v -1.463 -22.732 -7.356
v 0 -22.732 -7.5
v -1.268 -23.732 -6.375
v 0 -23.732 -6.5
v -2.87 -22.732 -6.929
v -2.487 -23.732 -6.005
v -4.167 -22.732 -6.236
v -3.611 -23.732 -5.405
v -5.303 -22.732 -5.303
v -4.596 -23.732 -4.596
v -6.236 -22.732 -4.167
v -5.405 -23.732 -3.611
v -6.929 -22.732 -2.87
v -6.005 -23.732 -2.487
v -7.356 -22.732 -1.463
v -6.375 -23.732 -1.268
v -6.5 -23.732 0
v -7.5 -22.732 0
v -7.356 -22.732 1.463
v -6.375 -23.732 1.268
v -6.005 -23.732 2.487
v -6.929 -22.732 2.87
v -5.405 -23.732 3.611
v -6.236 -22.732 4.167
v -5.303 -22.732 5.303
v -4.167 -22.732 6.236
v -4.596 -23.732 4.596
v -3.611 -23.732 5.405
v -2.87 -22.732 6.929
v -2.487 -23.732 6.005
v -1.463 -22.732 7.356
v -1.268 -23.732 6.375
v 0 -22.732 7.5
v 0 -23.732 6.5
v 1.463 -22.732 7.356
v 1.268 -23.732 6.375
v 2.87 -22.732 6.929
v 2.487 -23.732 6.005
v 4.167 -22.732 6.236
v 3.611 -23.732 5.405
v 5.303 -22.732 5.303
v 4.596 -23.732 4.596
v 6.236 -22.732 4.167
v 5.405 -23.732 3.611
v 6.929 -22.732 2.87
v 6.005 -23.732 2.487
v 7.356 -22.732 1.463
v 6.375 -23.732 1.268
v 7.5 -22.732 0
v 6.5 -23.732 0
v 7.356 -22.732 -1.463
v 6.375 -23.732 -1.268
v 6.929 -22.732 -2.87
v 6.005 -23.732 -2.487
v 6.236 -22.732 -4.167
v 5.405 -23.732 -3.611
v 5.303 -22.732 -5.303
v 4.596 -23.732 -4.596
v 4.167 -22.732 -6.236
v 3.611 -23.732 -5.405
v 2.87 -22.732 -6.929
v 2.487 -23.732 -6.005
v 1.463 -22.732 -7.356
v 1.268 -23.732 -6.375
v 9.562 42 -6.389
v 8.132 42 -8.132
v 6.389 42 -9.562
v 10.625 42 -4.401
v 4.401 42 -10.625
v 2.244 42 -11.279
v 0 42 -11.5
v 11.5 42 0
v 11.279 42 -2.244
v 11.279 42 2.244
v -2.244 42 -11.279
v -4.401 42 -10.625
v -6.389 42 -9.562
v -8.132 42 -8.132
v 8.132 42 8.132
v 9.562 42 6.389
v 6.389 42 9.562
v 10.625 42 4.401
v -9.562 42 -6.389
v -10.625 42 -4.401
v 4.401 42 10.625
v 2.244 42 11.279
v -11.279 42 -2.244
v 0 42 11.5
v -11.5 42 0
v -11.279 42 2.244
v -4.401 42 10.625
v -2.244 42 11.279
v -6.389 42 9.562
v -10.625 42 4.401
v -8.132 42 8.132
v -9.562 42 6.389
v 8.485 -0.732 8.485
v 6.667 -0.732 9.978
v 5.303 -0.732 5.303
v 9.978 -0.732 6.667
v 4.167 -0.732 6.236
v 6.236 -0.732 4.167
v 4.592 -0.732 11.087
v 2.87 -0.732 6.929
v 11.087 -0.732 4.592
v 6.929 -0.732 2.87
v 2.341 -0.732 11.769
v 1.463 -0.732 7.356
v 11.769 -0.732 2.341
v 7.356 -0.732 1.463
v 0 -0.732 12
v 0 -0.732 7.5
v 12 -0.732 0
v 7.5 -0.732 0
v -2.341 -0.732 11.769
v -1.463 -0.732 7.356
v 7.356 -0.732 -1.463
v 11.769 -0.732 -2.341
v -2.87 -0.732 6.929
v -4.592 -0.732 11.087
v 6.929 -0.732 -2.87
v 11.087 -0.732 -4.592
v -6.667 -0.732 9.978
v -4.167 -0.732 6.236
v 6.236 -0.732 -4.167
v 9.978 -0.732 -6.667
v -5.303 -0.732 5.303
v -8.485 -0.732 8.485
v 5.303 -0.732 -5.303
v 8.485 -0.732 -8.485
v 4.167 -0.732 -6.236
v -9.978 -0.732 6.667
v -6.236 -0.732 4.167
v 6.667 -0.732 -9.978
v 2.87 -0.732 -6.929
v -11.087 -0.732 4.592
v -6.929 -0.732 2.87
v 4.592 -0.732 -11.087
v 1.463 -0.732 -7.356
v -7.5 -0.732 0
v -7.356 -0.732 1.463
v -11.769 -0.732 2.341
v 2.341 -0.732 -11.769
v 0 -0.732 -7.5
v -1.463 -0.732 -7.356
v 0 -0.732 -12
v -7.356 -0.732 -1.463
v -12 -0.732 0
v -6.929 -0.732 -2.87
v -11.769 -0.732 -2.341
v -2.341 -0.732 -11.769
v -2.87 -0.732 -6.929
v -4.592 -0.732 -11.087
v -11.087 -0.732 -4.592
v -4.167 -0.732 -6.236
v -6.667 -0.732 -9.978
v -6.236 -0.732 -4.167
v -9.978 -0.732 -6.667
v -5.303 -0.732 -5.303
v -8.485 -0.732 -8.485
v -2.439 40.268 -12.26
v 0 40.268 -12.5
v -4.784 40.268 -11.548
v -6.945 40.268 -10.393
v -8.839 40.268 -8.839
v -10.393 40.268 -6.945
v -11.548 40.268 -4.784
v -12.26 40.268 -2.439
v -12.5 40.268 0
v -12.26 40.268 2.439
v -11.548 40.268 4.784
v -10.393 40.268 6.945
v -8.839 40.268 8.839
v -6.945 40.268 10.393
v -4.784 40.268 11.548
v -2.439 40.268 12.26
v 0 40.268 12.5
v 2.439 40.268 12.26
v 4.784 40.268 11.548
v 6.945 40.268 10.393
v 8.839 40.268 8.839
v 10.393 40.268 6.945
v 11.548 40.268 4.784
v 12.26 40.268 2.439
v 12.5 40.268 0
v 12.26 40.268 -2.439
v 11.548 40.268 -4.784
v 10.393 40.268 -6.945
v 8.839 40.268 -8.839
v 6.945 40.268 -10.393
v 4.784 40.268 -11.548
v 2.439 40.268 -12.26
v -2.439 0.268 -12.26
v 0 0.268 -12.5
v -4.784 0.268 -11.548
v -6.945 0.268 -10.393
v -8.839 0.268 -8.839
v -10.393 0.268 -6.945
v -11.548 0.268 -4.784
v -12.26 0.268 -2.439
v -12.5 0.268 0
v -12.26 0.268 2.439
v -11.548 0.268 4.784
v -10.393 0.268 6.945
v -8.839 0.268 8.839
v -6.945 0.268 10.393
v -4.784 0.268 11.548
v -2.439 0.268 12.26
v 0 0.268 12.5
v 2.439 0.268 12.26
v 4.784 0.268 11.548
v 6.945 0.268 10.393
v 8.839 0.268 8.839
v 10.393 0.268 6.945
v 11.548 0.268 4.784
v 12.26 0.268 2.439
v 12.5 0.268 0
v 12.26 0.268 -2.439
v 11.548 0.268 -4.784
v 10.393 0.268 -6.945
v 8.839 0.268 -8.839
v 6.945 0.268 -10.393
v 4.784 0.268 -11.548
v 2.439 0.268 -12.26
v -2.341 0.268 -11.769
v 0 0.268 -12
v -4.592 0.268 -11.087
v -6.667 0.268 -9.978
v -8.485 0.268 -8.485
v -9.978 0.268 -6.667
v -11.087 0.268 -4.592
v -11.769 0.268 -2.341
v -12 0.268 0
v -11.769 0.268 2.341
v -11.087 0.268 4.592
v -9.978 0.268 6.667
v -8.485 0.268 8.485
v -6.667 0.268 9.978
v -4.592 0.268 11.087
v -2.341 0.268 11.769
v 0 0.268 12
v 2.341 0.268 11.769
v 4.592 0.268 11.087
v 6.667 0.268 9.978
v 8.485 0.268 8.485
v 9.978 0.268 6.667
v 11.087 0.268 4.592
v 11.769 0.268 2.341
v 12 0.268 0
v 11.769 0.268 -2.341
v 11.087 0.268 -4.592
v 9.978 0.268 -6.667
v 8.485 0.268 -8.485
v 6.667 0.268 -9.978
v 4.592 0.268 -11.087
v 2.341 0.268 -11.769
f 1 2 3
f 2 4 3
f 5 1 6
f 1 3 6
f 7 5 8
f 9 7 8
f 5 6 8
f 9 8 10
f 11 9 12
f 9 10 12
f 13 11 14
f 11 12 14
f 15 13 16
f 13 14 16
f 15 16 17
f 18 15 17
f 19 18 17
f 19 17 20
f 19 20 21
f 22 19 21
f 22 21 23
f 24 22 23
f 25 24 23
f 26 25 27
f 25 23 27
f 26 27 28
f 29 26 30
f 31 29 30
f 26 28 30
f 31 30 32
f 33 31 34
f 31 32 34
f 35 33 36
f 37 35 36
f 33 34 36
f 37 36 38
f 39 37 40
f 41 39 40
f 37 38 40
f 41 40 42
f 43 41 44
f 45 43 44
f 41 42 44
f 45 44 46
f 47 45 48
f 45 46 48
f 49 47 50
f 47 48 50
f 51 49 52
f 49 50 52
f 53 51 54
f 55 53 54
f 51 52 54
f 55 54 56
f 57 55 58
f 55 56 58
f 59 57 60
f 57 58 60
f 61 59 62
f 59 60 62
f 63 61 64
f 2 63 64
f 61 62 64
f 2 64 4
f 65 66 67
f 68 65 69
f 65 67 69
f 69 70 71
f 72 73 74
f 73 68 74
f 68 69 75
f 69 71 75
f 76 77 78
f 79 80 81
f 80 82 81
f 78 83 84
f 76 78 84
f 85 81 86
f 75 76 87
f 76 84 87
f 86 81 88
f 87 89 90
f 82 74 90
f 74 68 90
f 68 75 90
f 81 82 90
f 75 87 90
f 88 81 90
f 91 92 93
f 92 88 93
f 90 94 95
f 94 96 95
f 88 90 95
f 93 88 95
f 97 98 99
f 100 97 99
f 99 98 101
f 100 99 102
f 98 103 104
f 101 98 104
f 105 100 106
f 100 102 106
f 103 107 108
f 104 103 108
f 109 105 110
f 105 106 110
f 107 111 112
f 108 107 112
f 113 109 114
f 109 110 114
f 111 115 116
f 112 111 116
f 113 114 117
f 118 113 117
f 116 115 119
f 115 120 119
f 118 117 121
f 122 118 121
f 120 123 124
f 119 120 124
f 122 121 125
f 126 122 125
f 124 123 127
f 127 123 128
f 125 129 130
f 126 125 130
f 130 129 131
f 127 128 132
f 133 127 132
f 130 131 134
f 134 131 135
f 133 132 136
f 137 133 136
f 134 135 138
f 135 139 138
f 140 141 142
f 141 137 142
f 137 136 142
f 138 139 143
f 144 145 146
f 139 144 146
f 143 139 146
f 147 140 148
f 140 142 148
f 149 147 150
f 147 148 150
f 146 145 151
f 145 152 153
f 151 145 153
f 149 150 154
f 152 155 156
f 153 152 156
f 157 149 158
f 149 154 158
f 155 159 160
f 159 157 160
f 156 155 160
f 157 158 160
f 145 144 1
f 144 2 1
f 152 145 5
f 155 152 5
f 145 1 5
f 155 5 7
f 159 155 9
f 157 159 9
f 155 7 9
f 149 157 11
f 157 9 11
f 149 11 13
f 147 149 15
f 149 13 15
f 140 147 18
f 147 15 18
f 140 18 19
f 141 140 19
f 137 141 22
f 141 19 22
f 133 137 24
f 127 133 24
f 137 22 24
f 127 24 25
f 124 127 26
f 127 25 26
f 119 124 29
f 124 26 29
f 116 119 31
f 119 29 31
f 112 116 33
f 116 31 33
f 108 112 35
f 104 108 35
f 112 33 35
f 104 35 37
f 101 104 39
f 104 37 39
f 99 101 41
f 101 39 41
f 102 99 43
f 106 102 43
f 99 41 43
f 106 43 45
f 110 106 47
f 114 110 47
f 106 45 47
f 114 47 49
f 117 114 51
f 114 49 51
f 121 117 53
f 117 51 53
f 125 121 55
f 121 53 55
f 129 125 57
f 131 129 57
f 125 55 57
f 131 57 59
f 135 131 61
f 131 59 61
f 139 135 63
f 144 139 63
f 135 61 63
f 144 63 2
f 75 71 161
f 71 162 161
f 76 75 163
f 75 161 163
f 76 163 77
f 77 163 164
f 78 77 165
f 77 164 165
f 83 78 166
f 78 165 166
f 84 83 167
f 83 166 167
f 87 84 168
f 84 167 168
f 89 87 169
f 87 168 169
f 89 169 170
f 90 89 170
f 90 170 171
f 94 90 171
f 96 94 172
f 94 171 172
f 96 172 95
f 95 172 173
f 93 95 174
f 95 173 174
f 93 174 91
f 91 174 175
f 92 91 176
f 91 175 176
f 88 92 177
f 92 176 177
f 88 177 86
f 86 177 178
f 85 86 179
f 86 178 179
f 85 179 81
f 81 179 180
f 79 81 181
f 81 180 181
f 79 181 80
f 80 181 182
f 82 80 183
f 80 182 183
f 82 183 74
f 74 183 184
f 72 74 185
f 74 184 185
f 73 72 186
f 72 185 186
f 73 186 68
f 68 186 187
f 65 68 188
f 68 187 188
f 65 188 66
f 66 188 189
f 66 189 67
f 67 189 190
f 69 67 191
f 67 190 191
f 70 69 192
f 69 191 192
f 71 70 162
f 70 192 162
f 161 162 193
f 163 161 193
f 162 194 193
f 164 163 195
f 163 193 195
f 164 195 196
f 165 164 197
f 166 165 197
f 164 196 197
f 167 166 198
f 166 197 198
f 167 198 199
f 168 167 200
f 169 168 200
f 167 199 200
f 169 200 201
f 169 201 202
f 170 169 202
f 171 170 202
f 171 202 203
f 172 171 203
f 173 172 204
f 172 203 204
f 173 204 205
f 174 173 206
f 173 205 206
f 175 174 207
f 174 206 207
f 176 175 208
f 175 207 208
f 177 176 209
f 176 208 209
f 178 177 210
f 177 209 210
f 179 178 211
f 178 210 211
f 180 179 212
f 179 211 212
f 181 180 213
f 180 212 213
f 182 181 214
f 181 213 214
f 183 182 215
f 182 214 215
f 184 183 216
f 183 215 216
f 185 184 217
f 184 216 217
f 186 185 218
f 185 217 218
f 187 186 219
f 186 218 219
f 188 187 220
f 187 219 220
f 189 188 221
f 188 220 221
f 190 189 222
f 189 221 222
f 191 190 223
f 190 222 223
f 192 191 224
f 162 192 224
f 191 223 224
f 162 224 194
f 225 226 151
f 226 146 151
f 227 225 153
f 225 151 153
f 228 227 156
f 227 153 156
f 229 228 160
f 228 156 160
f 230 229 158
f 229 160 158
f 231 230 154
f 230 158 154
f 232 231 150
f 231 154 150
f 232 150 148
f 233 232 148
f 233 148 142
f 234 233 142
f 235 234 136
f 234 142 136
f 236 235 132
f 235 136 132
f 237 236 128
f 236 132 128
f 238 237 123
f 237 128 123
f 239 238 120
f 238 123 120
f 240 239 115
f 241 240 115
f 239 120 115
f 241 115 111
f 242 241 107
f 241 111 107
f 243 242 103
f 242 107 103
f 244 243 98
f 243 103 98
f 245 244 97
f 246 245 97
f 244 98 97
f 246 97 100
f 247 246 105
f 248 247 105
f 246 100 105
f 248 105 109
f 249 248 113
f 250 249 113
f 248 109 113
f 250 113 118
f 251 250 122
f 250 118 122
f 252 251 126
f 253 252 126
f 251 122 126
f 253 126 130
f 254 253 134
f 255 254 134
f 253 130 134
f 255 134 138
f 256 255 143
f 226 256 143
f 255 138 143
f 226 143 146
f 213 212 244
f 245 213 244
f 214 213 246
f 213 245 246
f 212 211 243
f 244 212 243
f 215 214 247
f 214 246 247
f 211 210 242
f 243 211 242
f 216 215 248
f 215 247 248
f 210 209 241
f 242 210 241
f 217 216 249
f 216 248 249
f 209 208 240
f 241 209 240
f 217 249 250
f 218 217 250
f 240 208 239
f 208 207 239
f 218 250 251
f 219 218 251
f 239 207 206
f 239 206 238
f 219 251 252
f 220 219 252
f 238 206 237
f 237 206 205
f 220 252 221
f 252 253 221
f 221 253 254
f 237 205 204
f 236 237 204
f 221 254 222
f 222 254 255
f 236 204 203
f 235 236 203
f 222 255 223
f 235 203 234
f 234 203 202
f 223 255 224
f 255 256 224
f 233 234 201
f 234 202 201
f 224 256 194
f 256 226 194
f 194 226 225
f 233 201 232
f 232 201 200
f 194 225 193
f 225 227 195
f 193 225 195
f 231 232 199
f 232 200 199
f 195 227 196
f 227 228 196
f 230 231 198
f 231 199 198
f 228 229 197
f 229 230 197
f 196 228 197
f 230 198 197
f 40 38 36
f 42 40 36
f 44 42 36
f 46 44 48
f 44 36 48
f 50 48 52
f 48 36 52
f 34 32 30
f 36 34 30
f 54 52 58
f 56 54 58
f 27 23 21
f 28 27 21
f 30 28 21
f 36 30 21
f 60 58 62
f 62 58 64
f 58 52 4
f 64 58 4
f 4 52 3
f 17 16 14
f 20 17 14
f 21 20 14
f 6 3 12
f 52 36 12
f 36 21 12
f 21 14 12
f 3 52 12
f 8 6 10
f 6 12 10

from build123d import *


with BuildPart() as part:
    # 草图1 → 旋转1 (revolve)
    with BuildSketch(Plane.XY, mode=Mode.PRIVATE) as revolve_1_sk:
        Polygon((0, 0), (0, 42), (11.5, 42), (12.5, 40.267949192), (12.5, 0.267949192), (12, 0.267949192), (12, -0.732050808), (7.5, -0.732050808), (7.5, -22.732050808), (6.5, -23.732050808), (0, -23.732050808), align=None)
    revolve(revolve_1_sk.sketch.rotate(Axis((0, 0, 0), (0, 1, 0)), 90), axis=Axis((0, 0, 0), (0, 1, 0)))


solid = part.part
